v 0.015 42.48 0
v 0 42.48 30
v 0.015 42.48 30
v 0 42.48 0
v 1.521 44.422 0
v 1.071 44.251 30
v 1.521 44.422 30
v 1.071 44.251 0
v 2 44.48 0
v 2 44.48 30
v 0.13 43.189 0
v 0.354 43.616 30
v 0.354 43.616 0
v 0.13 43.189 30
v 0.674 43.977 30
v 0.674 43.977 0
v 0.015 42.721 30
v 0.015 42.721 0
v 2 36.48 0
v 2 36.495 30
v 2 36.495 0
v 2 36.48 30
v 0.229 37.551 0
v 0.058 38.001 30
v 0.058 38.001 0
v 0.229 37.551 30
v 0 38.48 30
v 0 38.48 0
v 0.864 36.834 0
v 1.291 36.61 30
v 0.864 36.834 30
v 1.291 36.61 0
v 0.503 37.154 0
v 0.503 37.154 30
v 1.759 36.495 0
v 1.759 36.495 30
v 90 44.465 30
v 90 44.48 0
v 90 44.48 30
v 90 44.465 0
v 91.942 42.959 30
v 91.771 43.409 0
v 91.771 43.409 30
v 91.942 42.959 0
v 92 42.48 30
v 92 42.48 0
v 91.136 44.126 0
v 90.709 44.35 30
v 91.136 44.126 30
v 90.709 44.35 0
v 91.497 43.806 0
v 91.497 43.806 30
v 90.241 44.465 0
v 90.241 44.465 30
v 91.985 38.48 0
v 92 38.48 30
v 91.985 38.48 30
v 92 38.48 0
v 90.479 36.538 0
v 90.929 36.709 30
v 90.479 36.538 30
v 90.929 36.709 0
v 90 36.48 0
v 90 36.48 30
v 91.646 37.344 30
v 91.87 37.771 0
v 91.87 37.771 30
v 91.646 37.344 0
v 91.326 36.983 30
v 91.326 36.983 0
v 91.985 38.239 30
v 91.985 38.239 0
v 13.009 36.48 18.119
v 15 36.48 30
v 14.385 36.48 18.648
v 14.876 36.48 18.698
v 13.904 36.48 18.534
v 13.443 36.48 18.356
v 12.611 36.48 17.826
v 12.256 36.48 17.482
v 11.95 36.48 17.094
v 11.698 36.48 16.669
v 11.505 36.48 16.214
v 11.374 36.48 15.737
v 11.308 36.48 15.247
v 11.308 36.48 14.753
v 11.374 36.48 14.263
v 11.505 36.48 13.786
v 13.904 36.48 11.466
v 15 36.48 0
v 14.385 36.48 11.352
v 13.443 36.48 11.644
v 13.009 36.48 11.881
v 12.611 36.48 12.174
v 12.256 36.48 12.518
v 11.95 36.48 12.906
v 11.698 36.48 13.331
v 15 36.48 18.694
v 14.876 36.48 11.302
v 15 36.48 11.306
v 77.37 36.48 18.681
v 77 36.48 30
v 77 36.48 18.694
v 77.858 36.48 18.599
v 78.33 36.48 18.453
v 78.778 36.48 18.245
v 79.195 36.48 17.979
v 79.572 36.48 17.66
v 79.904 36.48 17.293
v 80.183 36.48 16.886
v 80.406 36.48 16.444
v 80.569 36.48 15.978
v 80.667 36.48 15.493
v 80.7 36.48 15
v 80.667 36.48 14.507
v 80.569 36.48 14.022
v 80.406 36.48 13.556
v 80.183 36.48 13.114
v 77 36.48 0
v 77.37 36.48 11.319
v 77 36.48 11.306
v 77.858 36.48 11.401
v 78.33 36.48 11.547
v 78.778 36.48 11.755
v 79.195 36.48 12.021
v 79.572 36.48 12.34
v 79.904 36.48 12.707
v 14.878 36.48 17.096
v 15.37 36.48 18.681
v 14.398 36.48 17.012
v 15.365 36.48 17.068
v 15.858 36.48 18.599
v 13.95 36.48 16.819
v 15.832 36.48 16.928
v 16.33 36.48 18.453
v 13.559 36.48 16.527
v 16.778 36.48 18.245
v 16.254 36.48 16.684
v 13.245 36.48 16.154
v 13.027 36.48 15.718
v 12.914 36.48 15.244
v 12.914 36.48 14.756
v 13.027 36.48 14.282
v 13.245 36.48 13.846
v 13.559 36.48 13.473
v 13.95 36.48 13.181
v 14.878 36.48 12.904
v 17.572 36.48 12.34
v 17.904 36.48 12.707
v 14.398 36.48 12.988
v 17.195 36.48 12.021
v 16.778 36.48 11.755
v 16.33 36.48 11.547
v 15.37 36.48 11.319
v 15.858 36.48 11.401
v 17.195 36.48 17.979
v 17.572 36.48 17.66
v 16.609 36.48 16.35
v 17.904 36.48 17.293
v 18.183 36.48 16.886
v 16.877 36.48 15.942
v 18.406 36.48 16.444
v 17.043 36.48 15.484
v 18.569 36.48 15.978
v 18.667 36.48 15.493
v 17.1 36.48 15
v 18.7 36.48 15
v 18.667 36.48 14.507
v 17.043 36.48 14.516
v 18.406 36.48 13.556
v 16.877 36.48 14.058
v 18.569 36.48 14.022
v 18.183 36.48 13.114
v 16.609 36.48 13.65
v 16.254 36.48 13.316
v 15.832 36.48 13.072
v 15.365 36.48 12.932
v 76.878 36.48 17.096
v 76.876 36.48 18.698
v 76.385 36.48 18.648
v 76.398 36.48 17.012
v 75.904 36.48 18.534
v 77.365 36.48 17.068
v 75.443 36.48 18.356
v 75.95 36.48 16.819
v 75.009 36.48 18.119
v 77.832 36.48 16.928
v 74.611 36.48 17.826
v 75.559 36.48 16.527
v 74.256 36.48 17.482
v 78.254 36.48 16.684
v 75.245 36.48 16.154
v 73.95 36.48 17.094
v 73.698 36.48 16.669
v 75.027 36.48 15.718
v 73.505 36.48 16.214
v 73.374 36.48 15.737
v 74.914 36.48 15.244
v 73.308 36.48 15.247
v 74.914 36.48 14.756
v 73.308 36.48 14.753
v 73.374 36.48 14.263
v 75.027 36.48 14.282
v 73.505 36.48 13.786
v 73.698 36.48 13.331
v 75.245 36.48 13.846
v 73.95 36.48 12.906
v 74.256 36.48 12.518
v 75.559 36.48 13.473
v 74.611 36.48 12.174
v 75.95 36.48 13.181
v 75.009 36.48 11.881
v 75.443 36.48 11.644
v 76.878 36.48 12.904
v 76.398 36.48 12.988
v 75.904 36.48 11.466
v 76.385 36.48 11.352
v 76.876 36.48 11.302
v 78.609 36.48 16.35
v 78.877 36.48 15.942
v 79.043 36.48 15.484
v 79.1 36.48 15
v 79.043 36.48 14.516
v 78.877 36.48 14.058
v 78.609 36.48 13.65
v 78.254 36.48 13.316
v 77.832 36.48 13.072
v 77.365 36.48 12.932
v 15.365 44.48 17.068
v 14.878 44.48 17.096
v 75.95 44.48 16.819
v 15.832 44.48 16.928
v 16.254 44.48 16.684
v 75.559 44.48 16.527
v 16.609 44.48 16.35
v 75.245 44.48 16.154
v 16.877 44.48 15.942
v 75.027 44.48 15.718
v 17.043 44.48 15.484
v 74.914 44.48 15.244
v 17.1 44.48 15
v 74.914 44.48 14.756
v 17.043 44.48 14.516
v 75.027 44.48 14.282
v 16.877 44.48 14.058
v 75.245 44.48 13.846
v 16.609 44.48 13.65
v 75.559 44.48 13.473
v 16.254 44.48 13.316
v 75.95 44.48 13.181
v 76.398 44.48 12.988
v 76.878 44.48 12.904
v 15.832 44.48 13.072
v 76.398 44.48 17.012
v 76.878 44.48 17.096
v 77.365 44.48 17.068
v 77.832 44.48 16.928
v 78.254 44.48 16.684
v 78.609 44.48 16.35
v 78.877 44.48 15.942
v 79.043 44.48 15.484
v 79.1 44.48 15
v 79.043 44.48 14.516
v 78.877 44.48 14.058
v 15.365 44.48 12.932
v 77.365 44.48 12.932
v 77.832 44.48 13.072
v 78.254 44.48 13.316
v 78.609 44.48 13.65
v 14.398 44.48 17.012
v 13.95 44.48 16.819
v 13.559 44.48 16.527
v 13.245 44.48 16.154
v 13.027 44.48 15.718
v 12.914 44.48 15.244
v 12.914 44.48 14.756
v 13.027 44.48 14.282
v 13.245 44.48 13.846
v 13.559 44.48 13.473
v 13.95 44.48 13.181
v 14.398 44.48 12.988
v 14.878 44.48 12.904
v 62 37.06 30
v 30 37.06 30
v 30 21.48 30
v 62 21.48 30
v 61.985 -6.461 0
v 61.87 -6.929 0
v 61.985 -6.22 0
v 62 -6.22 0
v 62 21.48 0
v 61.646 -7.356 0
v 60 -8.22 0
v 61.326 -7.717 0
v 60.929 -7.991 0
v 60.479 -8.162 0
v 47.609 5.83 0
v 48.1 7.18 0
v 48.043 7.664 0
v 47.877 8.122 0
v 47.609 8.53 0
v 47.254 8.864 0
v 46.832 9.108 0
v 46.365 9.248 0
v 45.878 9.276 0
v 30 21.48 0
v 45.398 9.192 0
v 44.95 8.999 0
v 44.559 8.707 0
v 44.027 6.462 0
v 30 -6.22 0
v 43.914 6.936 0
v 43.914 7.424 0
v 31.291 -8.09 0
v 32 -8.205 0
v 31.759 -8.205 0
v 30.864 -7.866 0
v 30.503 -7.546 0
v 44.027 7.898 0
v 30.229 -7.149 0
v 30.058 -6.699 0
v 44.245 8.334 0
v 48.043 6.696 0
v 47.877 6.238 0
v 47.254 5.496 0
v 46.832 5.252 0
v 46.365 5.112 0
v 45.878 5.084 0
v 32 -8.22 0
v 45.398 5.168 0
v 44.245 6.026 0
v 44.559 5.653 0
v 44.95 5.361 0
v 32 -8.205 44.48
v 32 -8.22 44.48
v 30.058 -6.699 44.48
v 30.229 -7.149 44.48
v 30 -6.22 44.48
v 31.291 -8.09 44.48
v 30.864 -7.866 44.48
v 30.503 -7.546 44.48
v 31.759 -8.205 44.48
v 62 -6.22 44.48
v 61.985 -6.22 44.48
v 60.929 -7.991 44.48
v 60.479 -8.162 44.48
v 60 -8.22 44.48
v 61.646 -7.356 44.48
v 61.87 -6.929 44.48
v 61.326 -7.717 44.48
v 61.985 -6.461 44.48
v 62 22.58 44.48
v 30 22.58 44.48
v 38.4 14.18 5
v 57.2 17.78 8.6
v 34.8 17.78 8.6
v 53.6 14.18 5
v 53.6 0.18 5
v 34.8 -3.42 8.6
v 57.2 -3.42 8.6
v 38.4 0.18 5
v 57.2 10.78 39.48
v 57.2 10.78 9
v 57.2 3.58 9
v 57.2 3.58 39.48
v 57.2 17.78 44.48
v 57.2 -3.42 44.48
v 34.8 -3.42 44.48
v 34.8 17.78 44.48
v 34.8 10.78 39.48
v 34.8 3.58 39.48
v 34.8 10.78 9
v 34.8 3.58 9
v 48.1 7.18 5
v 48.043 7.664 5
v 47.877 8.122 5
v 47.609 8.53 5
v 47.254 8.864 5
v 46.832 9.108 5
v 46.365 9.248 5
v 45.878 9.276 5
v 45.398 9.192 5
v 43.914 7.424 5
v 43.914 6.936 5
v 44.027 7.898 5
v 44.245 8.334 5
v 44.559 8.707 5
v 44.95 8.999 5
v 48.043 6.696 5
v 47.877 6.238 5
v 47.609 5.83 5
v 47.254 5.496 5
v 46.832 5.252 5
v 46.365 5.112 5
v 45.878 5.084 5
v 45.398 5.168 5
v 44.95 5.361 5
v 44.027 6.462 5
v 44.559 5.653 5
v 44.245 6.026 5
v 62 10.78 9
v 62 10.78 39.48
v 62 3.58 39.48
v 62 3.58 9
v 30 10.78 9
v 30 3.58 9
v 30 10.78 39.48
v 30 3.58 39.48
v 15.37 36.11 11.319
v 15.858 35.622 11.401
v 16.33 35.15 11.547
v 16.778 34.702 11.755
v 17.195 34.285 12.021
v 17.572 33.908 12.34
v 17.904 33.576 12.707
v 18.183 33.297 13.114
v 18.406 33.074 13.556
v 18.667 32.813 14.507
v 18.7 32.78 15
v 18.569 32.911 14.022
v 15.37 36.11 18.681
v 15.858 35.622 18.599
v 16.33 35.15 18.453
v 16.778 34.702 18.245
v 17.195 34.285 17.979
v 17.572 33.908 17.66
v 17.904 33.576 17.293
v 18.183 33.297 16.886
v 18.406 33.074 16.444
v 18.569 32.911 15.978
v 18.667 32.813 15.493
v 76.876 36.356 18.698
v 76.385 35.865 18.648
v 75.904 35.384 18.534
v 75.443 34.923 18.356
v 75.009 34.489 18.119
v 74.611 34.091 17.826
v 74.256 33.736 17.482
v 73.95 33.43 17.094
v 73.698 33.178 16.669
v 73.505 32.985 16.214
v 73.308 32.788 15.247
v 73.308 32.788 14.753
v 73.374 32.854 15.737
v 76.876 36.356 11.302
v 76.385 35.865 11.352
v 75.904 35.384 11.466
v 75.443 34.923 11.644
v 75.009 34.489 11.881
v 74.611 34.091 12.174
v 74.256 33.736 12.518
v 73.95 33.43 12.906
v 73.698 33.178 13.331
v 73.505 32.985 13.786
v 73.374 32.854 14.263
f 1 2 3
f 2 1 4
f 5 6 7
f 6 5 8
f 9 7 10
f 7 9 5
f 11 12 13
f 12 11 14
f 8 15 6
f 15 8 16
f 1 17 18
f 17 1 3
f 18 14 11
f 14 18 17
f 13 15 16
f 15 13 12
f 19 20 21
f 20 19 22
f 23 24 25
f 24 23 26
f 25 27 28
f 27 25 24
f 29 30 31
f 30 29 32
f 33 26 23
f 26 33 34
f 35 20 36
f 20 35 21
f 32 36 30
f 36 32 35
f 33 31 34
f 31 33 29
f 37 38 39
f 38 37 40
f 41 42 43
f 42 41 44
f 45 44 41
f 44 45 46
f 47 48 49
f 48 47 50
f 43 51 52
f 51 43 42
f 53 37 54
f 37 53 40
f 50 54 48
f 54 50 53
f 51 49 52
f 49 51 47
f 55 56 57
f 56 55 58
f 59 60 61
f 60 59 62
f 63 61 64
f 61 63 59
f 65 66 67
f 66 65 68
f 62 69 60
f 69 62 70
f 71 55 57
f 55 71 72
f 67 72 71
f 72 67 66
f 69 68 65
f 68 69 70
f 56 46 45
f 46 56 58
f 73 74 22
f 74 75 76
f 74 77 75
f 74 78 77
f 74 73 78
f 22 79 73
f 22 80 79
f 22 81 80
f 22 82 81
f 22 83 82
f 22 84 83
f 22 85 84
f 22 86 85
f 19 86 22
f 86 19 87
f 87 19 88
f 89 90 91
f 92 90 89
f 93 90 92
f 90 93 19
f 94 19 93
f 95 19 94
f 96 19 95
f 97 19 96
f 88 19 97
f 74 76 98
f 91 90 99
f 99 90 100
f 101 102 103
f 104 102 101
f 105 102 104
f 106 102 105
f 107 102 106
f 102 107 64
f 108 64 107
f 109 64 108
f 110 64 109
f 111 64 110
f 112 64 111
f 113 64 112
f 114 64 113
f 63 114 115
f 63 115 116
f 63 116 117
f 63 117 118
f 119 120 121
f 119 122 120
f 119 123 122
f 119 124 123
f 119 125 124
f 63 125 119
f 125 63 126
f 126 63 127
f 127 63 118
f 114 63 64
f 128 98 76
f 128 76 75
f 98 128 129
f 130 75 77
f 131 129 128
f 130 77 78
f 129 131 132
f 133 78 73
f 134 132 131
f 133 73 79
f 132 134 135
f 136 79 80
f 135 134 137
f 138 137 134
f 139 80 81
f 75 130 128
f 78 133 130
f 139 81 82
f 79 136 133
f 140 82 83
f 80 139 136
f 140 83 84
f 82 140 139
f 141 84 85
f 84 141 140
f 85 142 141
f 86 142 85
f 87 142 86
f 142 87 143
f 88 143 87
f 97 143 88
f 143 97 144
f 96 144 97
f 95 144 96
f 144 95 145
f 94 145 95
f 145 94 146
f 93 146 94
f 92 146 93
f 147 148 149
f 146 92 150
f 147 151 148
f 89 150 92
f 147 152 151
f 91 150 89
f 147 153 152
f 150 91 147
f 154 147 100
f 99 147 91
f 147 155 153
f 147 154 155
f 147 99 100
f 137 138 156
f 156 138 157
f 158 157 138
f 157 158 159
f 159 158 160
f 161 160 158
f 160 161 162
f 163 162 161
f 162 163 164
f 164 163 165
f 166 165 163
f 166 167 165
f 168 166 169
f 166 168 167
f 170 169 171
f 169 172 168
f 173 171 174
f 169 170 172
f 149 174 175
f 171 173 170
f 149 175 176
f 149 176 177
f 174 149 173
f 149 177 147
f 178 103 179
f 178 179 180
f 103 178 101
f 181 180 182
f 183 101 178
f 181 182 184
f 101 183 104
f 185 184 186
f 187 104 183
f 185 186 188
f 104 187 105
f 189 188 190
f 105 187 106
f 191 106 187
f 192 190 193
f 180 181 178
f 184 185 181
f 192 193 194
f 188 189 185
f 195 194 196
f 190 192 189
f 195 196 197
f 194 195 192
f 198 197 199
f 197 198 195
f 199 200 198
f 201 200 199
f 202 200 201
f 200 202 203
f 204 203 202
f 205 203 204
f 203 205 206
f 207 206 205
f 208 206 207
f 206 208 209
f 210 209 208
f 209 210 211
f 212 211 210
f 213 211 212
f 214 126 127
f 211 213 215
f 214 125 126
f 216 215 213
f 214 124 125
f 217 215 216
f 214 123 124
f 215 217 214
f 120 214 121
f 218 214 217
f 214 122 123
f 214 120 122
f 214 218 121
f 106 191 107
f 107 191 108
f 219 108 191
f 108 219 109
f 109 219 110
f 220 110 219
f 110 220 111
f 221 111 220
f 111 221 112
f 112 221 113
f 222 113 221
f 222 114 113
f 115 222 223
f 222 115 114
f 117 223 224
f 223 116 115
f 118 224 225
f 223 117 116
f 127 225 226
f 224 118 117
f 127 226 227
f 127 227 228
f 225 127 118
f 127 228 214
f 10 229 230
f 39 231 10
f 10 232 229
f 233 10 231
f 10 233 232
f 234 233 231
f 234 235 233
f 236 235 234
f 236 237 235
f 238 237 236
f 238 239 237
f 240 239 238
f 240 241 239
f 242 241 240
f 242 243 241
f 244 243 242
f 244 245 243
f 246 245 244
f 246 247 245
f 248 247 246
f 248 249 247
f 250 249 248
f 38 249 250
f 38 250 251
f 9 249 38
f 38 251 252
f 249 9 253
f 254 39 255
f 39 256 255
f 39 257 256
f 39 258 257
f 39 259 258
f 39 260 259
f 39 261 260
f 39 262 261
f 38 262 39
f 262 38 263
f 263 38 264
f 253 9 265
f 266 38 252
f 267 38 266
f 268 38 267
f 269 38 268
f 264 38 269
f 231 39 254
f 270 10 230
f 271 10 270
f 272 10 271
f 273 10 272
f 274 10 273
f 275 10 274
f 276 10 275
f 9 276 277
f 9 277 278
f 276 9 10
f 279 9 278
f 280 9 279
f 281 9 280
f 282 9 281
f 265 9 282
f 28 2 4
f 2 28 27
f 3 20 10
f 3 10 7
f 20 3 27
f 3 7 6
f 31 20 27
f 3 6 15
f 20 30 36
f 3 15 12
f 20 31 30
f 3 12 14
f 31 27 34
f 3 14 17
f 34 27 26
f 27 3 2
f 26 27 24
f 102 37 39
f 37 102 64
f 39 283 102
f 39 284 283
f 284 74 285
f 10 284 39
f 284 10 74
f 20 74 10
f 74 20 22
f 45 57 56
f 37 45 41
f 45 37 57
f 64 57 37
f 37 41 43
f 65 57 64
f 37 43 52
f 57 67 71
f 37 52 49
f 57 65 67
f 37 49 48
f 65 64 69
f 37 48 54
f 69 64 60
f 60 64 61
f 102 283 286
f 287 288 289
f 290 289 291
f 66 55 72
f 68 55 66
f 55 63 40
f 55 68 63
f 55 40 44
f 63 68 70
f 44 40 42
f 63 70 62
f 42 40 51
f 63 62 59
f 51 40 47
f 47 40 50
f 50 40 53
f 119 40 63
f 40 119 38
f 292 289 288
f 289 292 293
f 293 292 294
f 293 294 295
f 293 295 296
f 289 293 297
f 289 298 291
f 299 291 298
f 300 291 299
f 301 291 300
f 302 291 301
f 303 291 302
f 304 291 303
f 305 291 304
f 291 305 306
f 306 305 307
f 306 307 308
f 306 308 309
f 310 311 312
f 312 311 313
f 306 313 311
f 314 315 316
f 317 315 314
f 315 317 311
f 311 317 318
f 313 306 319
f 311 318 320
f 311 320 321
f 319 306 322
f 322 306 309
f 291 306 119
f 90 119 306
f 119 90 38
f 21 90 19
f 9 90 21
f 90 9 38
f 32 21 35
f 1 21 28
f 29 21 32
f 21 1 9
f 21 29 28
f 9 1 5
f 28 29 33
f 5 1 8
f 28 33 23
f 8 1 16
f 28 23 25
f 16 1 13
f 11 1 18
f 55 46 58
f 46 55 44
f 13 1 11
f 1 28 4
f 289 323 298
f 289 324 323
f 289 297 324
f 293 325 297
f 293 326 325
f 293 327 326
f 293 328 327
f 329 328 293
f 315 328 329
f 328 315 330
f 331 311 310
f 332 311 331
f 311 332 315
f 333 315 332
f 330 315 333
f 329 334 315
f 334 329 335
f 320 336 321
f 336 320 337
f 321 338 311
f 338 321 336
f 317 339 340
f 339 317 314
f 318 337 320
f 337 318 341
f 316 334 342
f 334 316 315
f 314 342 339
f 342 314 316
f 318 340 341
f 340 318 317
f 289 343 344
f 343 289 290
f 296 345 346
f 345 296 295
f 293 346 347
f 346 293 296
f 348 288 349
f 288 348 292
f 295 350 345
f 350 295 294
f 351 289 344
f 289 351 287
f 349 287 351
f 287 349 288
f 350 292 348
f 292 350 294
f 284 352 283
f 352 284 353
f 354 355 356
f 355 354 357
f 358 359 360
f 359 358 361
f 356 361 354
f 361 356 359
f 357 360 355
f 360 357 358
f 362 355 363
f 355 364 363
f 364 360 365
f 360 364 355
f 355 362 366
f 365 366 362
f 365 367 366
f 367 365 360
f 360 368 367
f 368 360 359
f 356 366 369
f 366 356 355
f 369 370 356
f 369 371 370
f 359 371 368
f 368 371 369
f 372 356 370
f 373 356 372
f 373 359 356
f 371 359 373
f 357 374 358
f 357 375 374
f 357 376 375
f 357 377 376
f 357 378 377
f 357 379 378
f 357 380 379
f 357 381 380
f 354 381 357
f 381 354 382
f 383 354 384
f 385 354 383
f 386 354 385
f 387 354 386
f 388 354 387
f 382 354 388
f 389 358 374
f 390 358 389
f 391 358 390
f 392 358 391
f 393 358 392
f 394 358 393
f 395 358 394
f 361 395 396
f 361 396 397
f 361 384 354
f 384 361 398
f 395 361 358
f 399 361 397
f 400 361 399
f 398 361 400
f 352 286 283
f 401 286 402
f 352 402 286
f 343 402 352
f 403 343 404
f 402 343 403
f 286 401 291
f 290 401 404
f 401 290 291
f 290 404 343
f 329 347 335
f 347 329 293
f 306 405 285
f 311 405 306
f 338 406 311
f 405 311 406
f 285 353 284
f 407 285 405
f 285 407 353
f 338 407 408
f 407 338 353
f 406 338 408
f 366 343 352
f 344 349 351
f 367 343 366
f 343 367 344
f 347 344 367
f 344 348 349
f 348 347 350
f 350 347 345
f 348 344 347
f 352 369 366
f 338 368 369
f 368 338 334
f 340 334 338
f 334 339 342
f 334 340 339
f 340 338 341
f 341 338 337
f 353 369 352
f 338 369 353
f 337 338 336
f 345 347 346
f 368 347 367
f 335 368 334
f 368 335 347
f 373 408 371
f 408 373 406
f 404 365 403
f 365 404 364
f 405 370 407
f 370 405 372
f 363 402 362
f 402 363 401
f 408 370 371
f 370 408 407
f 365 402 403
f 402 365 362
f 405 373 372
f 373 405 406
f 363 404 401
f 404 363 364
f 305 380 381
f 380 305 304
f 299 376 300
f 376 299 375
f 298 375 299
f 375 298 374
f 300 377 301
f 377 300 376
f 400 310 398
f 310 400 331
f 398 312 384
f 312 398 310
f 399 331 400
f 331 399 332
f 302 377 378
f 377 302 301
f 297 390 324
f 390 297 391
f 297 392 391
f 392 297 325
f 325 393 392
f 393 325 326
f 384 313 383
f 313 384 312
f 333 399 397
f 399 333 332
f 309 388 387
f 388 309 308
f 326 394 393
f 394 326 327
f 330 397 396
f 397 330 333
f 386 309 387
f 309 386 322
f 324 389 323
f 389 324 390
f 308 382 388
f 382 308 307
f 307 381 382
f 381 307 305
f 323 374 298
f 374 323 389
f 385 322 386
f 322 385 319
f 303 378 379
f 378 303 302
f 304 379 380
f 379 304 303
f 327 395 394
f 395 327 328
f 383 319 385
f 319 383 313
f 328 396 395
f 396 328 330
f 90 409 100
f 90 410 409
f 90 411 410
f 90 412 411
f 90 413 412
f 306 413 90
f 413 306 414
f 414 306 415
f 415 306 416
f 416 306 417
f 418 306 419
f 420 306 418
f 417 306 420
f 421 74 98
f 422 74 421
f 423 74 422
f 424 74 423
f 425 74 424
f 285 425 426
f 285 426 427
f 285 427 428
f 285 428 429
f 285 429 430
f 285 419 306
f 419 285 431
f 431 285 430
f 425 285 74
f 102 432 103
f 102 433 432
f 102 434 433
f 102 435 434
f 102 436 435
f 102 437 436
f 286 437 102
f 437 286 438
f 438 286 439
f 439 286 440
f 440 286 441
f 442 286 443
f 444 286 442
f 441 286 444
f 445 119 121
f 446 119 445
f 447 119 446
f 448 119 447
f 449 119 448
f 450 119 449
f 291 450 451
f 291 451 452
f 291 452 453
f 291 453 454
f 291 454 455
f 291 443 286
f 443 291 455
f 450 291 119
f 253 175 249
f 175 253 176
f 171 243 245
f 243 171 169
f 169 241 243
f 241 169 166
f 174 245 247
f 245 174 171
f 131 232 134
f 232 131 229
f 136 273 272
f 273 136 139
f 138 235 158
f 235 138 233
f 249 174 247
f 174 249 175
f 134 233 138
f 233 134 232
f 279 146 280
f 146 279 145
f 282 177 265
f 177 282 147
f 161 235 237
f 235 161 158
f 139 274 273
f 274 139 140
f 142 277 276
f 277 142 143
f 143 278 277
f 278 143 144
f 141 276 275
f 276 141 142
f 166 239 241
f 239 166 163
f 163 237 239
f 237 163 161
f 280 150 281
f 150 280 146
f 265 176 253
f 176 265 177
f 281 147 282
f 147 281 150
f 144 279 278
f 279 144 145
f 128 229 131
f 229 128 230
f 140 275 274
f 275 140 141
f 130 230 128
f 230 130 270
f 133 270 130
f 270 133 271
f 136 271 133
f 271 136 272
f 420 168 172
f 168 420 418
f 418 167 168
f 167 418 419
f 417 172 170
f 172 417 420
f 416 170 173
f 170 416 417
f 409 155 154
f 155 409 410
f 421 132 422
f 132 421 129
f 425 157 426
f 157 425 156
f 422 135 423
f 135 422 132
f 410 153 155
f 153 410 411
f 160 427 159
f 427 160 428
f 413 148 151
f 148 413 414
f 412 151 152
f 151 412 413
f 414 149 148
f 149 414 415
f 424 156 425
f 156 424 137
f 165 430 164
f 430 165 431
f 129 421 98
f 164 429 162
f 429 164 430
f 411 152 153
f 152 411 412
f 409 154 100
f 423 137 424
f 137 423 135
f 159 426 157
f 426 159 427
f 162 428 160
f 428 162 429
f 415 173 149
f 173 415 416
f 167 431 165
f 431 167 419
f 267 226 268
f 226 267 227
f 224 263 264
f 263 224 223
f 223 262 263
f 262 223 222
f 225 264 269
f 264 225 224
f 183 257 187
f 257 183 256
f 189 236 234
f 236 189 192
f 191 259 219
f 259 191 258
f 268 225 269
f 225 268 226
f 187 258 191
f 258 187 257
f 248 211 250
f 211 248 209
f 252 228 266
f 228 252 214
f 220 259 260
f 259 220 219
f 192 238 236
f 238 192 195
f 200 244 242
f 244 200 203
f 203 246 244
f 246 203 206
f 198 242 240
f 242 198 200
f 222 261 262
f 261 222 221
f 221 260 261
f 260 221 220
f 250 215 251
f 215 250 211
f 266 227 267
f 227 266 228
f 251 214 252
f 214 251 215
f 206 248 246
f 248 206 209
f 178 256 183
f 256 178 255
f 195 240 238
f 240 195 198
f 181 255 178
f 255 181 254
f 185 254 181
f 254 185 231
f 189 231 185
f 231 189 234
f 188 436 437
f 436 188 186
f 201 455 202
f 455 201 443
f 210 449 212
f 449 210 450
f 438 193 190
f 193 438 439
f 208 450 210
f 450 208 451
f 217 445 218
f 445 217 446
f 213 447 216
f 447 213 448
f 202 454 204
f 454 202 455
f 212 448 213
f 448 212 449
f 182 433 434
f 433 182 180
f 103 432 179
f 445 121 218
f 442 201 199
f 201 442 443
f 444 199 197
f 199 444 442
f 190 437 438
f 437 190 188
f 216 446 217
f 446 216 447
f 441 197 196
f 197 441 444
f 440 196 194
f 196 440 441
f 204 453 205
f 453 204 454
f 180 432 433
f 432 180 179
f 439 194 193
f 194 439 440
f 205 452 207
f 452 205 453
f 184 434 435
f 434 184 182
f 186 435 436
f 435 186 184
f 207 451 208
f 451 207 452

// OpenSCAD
// file: oscad_utils/bolts.scad
/*
 *    OpenScad functions to make bolt holes
 *
 *    Copyright (C) 2016 Felipe Machado
 *    Universidad Rey Juan Carlos, Spain
 *    https://github.com/felipe-m
 *    License: LGPL 3.0 or later
 *
 *    to use this functions include in your file:
 * use <bolts.scad>
 *    if not in the same directory:
 * use <PATH_TO/bolts.scad>
 *    dont use 'include' instead of 'use' so you dont get the objects
 *    created in this file
*/


include <bolt_sizes.scad>

// the hole for the bolt shank and the nut
// Tolerances have to be included
// r_shank: Radius of the shank (tolerance included)
// l_bolt: total length of the bolt: head & shank
// r_head: radius of the head (tolerance included)
// l_head: length of the head
// hex_head: inidicates if the head is hexagonal or rounded
//            1: hexagonal
//            0: rounded
// h_layer3d: height of the layer for printing, if 0, means that the support
//            is not needed
// mnfold: 1 if you want 1 mm on top and botton to avoid non-manifold
//             pieces after makeing differences


module bolt_hole (r_shank, l_bolt, r_head, l_head, hex_head, h_layer3d, mnfold)
{
  union () {
    // we make it all the way, although it is not necessary because
    // on the lower part it will be also the nut 
    // if mnfold == 1 it will make the translations and make the piece 
    // larger
    translate([0,0,-mnfold])
      cylinder (r= r_shank, h= l_bolt+2*mnfold, $fa=1, $fs=0.5);
   if (hex_head == 0) {
      translate([0,0,-mnfold])
        cylinder (r= r_head, h= l_head+mnfold, $fa=1, $fs=0.5);  
   } else {
      translate([0,0,-mnfold])
      cylinder (r= r_head, h= l_head+mnfold, $fn=6);  
   }
    
  // This is a triangle that it is barely supported by the bolt head
  // and it will support the circle above 
  // In a regular triangle the apotheme (in radius) is twice
  // the circumradius (r)
  // Intersection with the hexagon to take the vertexs away, because
  // they are outside the hexagon
  if ( h_layer3d > 0) { // we don't do this if h_layer3d == 0
    intersection () {  
      rotate([0,0,30])translate([0,0,l_head])
        cylinder (r= r_shank*2, h=h_layer3d, $fn=3);
      // take vetexs away:
      if (hex_head == 0) {
        translate([0,0,l_head])
          cylinder (r= r_head, h= h_layer3d, $fa=1, $fs=0.5);       
      } else {
        translate([0,0,l_head])
          cylinder (r= r_head, h= h_layer3d, $fn=6);           
      }
    }
        // 1.15 is the relationship between the Radius and the Apothem
    // of the hexagon: sqrt(3)/2 . I make it slightly smaller
    translate([0,0,l_head+h_layer3d])
      //rotate ([0,0,30])
      cylinder (r=r_shank*1.15, h=h_layer3d, $fn=6);  
  
  }
 
 }  
  
}



bolt_hole (r_shank= m4_r_tol, l_bolt=10, r_head=m4_head_r_tol, l_head=m4_head_l, h_layer3d);


bolt_hole (r_shank = m4_r_tol, l_bolt=10, r_head=m4_head_r_tol, l_head=m4_head_l, hex_head=1, h_layer3d=h_layer3d, mnfold=1);

translate ([10,0,0])
#bolt_hole (r_shank = m4_r_tol, l_bolt=10, r_head=m4_head_r_tol, l_head=m4_head_l, hex_head=0, h_layer3d=h_layer3d, mnfold=0);
// file: oscad_utils/bolt_sizes.scad
/*
 *    OpenScad constants for bolt
 *
 *    Copyright (C) 2016 Felipe Machado
 *    Universidad Rey Juan Carlos, Spain
 *    https://github.com/felipe-m
 *    License: LGPL 3.0 or later
 *
 *    to use this functions include in your file:
 * include <bolts.scad>
 *    if not in the same directory:
 * include <PATH_TO/bolts.scad>
*/


// Tolerance
tol =  0.4;
// Tolerance for small objects
stol = 0.2;

h_layer3d = 0.3;
$fa=1;
$fs=0.5;

// Nuts and bolt sizes
m3_r = 1.5;  
m4_r = 2;    
m5_r = 2.5;  

// Tolerances stol/2 because is the radius
m3_r_tol = m3_r + stol/2;  // M3 diameter 3.2 mm for the tolerance
m4_r_tol = m4_r + stol/2;  // M4 diameter 4.2 mm for the tolerance
m5_r_tol = m5_r + (tol + stol)/4;  // M5 diameter 5.3 mm for the tolerance
//echo ("m3_r_tol", m3_r_tol);
//echo ("m4_r_tol", m4_r_tol);

// -------------- Head sizes DIN-912 bolts
// Head radius DIN-912 bolts
m3_head_r  = 5.5/2;
m4_head_r  = 7/2;
m5_head_r  = 8.5/2;
m6_head_r  = 10/2;
m8_head_r  = 13/2;
m10_head_r = 16/2;

// Head radius DIN-912 bolts with tolerances. 
// divided by 2 because is the radius
m3_head_r_tol  = m3_head_r  + tol/2;
m4_head_r_tol  = m4_head_r  + tol/2;
m5_head_r_tol  = m5_head_r  + tol/2;
m6_head_r_tol  = m6_head_r  + tol/2;
m8_head_r_tol  = m8_head_r  + tol/2;
m10_head_r_tol = m10_head_r + tol/2;

// Head length DIN-912 bolts
m3_head_l = 3;
m4_head_l = 4;
m5_head_l = 4;
m6_head_l = 6;
m8_head_l = 8;

// M3 nut
m3_nut_r = 6.01/2;  // DIN934 M3 nut circumradius
m3_nut_h = 2.4;     // DIN934 M3 nut height

//less tolerance for small numbers. 0.2 (diameter)
m3_nut_r_tol = m3_nut_r + stol/2;  //radius: diam/2
m3_nut_h_tol = m3_nut_h + tol;

// M4 nut
m4_nut_r = 7.66/2;  // DIN934 M4 nut circumradius
m4_nut_h = 3.2;     // DIN934 M4 nut height
m4_nut_ap = 7/2;    // DIN934 M4 nut apotheme

//less tolerance for small numbers. 0.2 (diameter)
m4_nut_r_tol  = m4_nut_r + stol/2;  //radius: diam/2
m4_nut_h_tol  = m4_nut_h + tol;
m4_nut_ap_tol = m4_nut_ap + stol/2; 

// -------------------- DIN 9021 Washers ----------------
// outer radius (or)
m6_wash9021_or = 18 / 2;
// height
m6_wash9021_h = 1.6;
// main file
/* Tensioner holder
  ----------------------------------------------------------------------------
  -- (c) Felipe Machado
  -- Area of Electronic Technology. Rey Juan Carlos University (urjc.es)
  -- https://github.com/felipe-m
  -- December-2017
  ----------------------------------------------------------------------------
  --- LGPL Licence
  ----------------------------------------------------------------------------


                   
                    ________   
                   /______ /|  
                  |  ___  | |     Z               
                  | |   | |/\     :
                  | |___| |\ \    :
              ____|_______| \ \___:
      X....../___/ \       \ \/__/| 
             |______\_______\____|/
                                 .
                                .
                               .
                              Y
                                              Z      Z
                                              :      :
                               _______        :      :______________
                              |  ___  |       :      |  __________  |
                              | |   | |       :      | |__________| |
                             /| |___| |\      :      |________      |
                            / |_______| \     :      |        |    /      
                    .. ____/  |       |  \____:      |________|  /
        hold_bas_h.+..|_::____|_______|____::_|      |___::___|/......Y
 
                       .... hold_bas_w ........
                      :        .hold_w.        :
                      :       :    wall_thick  :
                      :       :      +         :
                      :       :     : :        :
               X......:_______:_____:_:________:....
                      |    |  | :   : |  |     |    :
                      |  O |  | :   : |  |  O  |    + hold_bas_l
                      |____|__| :   : |__|_____|....:
                              | :   : |        :
                              |_:___:_|        :
                                               :
                                               :
                                               :
                                               Y



                   ___:___          
                  |  ___  |         
                  | | 1 | |         
                 /| |___| |\       
                / |_______| \      
           ____/  |       |  \____ ...
          |_::____|___2___|____::_|..: holder_base_z


*/




include <oscad_utils/bolt_sizes.scad> // include to use the constants
use <oscad_utils/fillet.scad>
use <oscad_utils/bolts.scad>  
// where the constants are defined
include <kidler.scad>

module tensioner_holder()
{
  difference () {
    union () 
    {
      difference () {
      /* --------------- step 01 --------------------------- 
         the base, to attach it to the aluminum profiles
         

                                                Z      Z
                                                :      :
                      .. _______________________:      :________
          hold_bas_h.+..|_______________________|      |________|......Y
 
                         .... hold_bas_w ........
                        :                        :
                 X......:________________________:....
                        |                        |    :
                        |                        |    + hold_bas_l
                        |________________________|....:
                                                 :
                                                 Y
        */

        cube([hold_bas_w, hold_bas_l, hold_bas_h]);

      /* --------------- step 02 --------------------------- 
         Fillet the base
         The piece will be printed on the XZ plane, so this fillet will be 
         raising
       

                                              Z
                                              :
                     f4_______________________f2
               X......(_______________________)
                     f3                        f1
        */
        // fillet f1
        fillet_dif_y (r=in_fillet, h = hold_bas_l, xdir=-1, zdir=-1, fillet=1);
        // fillet f2
        translate ([0,0, hold_bas_h])
          fillet_dif_y (r=in_fillet, h = hold_bas_l, xdir=-1, zdir=1, fillet=1);
        // fillet f3
        translate ([hold_bas_w,0, 0])
          fillet_dif_y (r=in_fillet, h = hold_bas_l, xdir=1, zdir=-1, fillet=1);
        // fillet f4
        translate ([hold_bas_w,0, hold_bas_h])
          fillet_dif_y (r=in_fillet, h = hold_bas_l, xdir=1, zdir=1, fillet=1);
      } //end of difference

      /* --------------- step 03 --------------------------- 
         The main box
                                  aluprof_w   Z      Z
                                       ..+....:      :
                .............. _______:       :      :____________
                :             |       |       :      |            |
                :             |       |       :      |            |
        hold_h +:             |       |       :      |            |
                :             |       |       :      |            |     
                :      _______|       |_______:      |________    |
            X...:.....(_______|_______|_______)      |________|___|...Y
                                                     :            :
                       .... hold_bas_w ........      :.. hold_l...:
                      :                        :
                      :        .hold_w.        :
                      :       :       :        :
               X......:_______:_______:________:....
                      |       |       |        |    :
                      |       |       |        |    + hold_bas_l
                      |_______|       |________|....:
                              |       |        :
                              |_______|        :
                                               :
                                               :
                                               Y

      */
      // union: element 2
      translate ([aluprof_w,0,0])
      {
        difference () {

          cube([hold_w, hold_l, hold_h]);

      /* --------------- step 04 --------------------------- 
         Fillets on top
                                  aluprof_w   Z
                                       ..+....:
                .............f2_______f1      : 
                :             /       \       :
                :             |       |       :
        hold_h +:             |       |       :
                :             |       |       :
                :      _______|       |_______:
            X...:.....(_______|_______|_______)
      */

          // Fillet f1
          translate ([0,0, hold_h])
            fillet_dif_y (r=in_fillet, h=hold_l, xdir=-1,zdir=1,fillet=1);
          // Fillet f2
          translate ([hold_w,0, hold_h])
            fillet_dif_y (r=in_fillet, h=hold_l, xdir=1,zdir=1,fillet=1);

      /* --------------- step 05 --------------------------- 
         large chamfer at the bottom

                                              Z      Z
                                              :      :
        Option A               _______        :      :____________
                              /       \       :      |            |
                              |       |       :      |            |
                              |_______|       :      |            |
                              |       |       :      |           /       
                       _______|_______|_______:      |________ /  
            X.........(_______________________)      |________|.......Y
                                                     :            :

        
                                              Z      Z
                                              :      :
        Option B               _______        :      :____________
                              /       \       :      |            |
                              |       |       :      |            |
                              |       |       :      |            |
                              |_______|       :      |            |      
                       _______|       |_______:      |________   /  
            X.........(_______|_______|_______)      |________|/......Y
                                                     :            :
                                                                    
       */

          // option B: using more material (probably sturdier)
          //chmf_rad = min(hold_l - hold_bas_l,
          //               hold_h - (tens_h+2*wall_thick));
          // option A: using less material
          chmf_rad = min(hold_l-hold_bas_l+ hold_bas_h,
                         hold_h - (tens_h+2*wall_thick));
          translate ([0, hold_l,0])
            fillet_dif_x (r=chmf_rad, h= hold_w,
                          ydir=1, zdir=-1, fillet=0);

      /* --------------- step 06 --------------------------- 
         Hole for the tensioner
                                              Z      Z
                                              :      :
                               _______        :      :____________
                              /  ___  \       :      |c2..........|
                              | |   | |       :      | :          |
                              | |___| |       :      |c1..........|
                              |_______|       :      |            |      
                       _______|       |_______:      |________   /  
            X.........(_______|_______|_______)      |________|/......Y

      */

          translate ([wall_thick-tol/2, hold_l-tens_l_inside,tens_pos_h-tol/2])
          {
            difference () 
            {
              cube([tens_w_tol, tens_l_inside+1, tens_h_tol]);
              // chamfers on the nut corner. Chamfer c1
              fillet_dif_x (r=2*in_fillet-tol, h=tens_w_tol,
                            ydir=-1, zdir=-1, fillet=0);   
              // chamfer c2
              translate([0,0,tens_h_tol])
                fillet_dif_x (r=2*in_fillet-tol, h=tens_w_tol,
                              ydir=-1, zdir=1, fillet=0); 
              // Optional chamfers, only if they have been done in the tensioner
              if (opt_tens_chmf == 1) { // optional tensioner chamfer
                fillet_dif_z (r=2*in_fillet-tol, h=tens_h_tol,
                              xdir=-1, ydir=-1, fillet=0);   
                translate([tens_w_tol,0,0])
                  fillet_dif_z (r=2*in_fillet-tol, h=tens_h_tol,
                                xdir=1, ydir=-1, fillet=0); 
              }

            }
          } 

      /* --------------- step 07 --------------------------- 
         A hole to be able to see inside, could be on one side or both
                                              Z      Z
                                              :      :
                               _______        :      :____________
                              /  ___  \       :      |  ._______ .|
                              |:|   |:|       :      | :|_______| |
                              | |___| |       :      |  ..........|
                              |_______|       :      |            |      
                       _______|       |_______:      |________   /  
            X.........(_______|_______|_______)      |________|/......Y

      */
          if (hold_hole_2sides == 1) {
            translate ([-1,
                        wall_thick + nut_holder_thick,
                        tens_pos_h +  tens_h /2 - m4_nut_ap_tol ])
              cube([hold_w+2,
                    hold_l - nut_holder_thick - 2* wall_thick,
                    2*m4_nut_ap_tol]);
          } else { // one side only
            translate ([hold_w-wall_thick-1,
                        wall_thick + nut_holder_thick,
                        tens_pos_h +  tens_h /2 - m4_nut_ap_tol ])
              cube([wall_thick+2,
                    hold_l - nut_holder_thick - 2* wall_thick,
                    2*m4_nut_ap_tol]);
          }
      /* --------------- step 08 --------------------------- 
         A hole for the leadscrew
                                              Z      Z
                                              :      :
                               _______        :      :____________
                              /  ___  \       :      |  ._______ .|
                              |:| O |:|       :      |::|_______| |
                              | |___| |       :      |  ..........|
                              |_______|       :      |            |      
                       _______|       |_______:      |________   /  
            X.........(_______|_______|_______)      |________|/......Y

      */
          translate ([hold_w/2, -1, tens_pos_h + tens_h/2])
            rotate ([-90,0,0])
            cylinder (r=bolttens_r_tol, h=wall_thick+2, $fa=1, $fs=0.5); 
        }
      }

      /* --------------- step 09 --------------------------- 
         Chamfer the unions
                                   Z   Z
                                   :   :
                    _______        :   :____________
                   /  ___  \       :   |  ._______ .|
                   |:| O |:|       :   |::|_______| |...
                  /| |___| |\      :   |  ..........|... tens_h/2 -m4_nut_ap_tol
                 / |_______| \     :   |            |  :+tens_pos_h
            ____/__|       |__\____:   |________   /   :  ...
        X..(_______|_______|_______)   |________|/.....:.....hold_bas_h
      */

      // union: element 3
      // this min is to avoid having the chamfer above the hole to see
      chmf_rad = min(aluprof_w/2,
                     tens_pos_h + tens_h/2 - m4_nut_ap_tol - hold_bas_h);
      translate ([aluprof_w, 0, hold_bas_h])
        fillet_add_y (r=chmf_rad, h=hold_bas_l, xdir=-1, zdir=1, fillet=0);
      translate ([hold_bas_w - aluprof_w, 0, hold_bas_h])
        fillet_add_y (r=chmf_rad, h=hold_bas_l, xdir=1, zdir=1,fillet=0);
  
    }
      /* --------------- step 10 --------------------------- 
         Bolt holes to attach the piece to the aluminum profile
                                   Z   Z
                                   :   :
                    _______        :   :____________
                   /  ___  \       :   |  ._______ .|
                   |:| O |:|       :   |::|_______| |
                  /| |___| |\      :   |  ..........|
                 / |_______| \     :   |            |
            ____/__|       |__\____:   |________   /
        X..(__::___|_______|__::___)   |___::___|/
      */
    translate ([aluprof_w/2,
                aluprof_w/2,
                hold_bas_h + boltaluprof_head_l])
        rotate ([180,0,0])
          bolt_hole (r_shank = boltaluprof_r_tol,
                     l_bolt = hold_bas_h + boltaluprof_head_l,
                     r_head = boltaluprof_head_r_tol,
                     l_head = boltaluprof_head_l, hex_head = 0, 
                     h_layer3d = 0, mnfold = 1);

    translate ([hold_bas_w - aluprof_w/2,
                aluprof_w/2,
                hold_bas_h + boltaluprof_head_l])
        rotate ([180,0,0])
          bolt_hole (r_shank = boltaluprof_r_tol,
                     l_bolt = hold_bas_h + boltaluprof_head_l,
                     r_head = boltaluprof_head_r_tol,
                     l_head = boltaluprof_head_l, hex_head = 0, 
                     h_layer3d = 0, mnfold = 1);
  }
}




// Rotation and translation to print, axis are moved
translate ([0, hold_l,0])
  rotate ([90,0,0])
    tensioner_holder();
